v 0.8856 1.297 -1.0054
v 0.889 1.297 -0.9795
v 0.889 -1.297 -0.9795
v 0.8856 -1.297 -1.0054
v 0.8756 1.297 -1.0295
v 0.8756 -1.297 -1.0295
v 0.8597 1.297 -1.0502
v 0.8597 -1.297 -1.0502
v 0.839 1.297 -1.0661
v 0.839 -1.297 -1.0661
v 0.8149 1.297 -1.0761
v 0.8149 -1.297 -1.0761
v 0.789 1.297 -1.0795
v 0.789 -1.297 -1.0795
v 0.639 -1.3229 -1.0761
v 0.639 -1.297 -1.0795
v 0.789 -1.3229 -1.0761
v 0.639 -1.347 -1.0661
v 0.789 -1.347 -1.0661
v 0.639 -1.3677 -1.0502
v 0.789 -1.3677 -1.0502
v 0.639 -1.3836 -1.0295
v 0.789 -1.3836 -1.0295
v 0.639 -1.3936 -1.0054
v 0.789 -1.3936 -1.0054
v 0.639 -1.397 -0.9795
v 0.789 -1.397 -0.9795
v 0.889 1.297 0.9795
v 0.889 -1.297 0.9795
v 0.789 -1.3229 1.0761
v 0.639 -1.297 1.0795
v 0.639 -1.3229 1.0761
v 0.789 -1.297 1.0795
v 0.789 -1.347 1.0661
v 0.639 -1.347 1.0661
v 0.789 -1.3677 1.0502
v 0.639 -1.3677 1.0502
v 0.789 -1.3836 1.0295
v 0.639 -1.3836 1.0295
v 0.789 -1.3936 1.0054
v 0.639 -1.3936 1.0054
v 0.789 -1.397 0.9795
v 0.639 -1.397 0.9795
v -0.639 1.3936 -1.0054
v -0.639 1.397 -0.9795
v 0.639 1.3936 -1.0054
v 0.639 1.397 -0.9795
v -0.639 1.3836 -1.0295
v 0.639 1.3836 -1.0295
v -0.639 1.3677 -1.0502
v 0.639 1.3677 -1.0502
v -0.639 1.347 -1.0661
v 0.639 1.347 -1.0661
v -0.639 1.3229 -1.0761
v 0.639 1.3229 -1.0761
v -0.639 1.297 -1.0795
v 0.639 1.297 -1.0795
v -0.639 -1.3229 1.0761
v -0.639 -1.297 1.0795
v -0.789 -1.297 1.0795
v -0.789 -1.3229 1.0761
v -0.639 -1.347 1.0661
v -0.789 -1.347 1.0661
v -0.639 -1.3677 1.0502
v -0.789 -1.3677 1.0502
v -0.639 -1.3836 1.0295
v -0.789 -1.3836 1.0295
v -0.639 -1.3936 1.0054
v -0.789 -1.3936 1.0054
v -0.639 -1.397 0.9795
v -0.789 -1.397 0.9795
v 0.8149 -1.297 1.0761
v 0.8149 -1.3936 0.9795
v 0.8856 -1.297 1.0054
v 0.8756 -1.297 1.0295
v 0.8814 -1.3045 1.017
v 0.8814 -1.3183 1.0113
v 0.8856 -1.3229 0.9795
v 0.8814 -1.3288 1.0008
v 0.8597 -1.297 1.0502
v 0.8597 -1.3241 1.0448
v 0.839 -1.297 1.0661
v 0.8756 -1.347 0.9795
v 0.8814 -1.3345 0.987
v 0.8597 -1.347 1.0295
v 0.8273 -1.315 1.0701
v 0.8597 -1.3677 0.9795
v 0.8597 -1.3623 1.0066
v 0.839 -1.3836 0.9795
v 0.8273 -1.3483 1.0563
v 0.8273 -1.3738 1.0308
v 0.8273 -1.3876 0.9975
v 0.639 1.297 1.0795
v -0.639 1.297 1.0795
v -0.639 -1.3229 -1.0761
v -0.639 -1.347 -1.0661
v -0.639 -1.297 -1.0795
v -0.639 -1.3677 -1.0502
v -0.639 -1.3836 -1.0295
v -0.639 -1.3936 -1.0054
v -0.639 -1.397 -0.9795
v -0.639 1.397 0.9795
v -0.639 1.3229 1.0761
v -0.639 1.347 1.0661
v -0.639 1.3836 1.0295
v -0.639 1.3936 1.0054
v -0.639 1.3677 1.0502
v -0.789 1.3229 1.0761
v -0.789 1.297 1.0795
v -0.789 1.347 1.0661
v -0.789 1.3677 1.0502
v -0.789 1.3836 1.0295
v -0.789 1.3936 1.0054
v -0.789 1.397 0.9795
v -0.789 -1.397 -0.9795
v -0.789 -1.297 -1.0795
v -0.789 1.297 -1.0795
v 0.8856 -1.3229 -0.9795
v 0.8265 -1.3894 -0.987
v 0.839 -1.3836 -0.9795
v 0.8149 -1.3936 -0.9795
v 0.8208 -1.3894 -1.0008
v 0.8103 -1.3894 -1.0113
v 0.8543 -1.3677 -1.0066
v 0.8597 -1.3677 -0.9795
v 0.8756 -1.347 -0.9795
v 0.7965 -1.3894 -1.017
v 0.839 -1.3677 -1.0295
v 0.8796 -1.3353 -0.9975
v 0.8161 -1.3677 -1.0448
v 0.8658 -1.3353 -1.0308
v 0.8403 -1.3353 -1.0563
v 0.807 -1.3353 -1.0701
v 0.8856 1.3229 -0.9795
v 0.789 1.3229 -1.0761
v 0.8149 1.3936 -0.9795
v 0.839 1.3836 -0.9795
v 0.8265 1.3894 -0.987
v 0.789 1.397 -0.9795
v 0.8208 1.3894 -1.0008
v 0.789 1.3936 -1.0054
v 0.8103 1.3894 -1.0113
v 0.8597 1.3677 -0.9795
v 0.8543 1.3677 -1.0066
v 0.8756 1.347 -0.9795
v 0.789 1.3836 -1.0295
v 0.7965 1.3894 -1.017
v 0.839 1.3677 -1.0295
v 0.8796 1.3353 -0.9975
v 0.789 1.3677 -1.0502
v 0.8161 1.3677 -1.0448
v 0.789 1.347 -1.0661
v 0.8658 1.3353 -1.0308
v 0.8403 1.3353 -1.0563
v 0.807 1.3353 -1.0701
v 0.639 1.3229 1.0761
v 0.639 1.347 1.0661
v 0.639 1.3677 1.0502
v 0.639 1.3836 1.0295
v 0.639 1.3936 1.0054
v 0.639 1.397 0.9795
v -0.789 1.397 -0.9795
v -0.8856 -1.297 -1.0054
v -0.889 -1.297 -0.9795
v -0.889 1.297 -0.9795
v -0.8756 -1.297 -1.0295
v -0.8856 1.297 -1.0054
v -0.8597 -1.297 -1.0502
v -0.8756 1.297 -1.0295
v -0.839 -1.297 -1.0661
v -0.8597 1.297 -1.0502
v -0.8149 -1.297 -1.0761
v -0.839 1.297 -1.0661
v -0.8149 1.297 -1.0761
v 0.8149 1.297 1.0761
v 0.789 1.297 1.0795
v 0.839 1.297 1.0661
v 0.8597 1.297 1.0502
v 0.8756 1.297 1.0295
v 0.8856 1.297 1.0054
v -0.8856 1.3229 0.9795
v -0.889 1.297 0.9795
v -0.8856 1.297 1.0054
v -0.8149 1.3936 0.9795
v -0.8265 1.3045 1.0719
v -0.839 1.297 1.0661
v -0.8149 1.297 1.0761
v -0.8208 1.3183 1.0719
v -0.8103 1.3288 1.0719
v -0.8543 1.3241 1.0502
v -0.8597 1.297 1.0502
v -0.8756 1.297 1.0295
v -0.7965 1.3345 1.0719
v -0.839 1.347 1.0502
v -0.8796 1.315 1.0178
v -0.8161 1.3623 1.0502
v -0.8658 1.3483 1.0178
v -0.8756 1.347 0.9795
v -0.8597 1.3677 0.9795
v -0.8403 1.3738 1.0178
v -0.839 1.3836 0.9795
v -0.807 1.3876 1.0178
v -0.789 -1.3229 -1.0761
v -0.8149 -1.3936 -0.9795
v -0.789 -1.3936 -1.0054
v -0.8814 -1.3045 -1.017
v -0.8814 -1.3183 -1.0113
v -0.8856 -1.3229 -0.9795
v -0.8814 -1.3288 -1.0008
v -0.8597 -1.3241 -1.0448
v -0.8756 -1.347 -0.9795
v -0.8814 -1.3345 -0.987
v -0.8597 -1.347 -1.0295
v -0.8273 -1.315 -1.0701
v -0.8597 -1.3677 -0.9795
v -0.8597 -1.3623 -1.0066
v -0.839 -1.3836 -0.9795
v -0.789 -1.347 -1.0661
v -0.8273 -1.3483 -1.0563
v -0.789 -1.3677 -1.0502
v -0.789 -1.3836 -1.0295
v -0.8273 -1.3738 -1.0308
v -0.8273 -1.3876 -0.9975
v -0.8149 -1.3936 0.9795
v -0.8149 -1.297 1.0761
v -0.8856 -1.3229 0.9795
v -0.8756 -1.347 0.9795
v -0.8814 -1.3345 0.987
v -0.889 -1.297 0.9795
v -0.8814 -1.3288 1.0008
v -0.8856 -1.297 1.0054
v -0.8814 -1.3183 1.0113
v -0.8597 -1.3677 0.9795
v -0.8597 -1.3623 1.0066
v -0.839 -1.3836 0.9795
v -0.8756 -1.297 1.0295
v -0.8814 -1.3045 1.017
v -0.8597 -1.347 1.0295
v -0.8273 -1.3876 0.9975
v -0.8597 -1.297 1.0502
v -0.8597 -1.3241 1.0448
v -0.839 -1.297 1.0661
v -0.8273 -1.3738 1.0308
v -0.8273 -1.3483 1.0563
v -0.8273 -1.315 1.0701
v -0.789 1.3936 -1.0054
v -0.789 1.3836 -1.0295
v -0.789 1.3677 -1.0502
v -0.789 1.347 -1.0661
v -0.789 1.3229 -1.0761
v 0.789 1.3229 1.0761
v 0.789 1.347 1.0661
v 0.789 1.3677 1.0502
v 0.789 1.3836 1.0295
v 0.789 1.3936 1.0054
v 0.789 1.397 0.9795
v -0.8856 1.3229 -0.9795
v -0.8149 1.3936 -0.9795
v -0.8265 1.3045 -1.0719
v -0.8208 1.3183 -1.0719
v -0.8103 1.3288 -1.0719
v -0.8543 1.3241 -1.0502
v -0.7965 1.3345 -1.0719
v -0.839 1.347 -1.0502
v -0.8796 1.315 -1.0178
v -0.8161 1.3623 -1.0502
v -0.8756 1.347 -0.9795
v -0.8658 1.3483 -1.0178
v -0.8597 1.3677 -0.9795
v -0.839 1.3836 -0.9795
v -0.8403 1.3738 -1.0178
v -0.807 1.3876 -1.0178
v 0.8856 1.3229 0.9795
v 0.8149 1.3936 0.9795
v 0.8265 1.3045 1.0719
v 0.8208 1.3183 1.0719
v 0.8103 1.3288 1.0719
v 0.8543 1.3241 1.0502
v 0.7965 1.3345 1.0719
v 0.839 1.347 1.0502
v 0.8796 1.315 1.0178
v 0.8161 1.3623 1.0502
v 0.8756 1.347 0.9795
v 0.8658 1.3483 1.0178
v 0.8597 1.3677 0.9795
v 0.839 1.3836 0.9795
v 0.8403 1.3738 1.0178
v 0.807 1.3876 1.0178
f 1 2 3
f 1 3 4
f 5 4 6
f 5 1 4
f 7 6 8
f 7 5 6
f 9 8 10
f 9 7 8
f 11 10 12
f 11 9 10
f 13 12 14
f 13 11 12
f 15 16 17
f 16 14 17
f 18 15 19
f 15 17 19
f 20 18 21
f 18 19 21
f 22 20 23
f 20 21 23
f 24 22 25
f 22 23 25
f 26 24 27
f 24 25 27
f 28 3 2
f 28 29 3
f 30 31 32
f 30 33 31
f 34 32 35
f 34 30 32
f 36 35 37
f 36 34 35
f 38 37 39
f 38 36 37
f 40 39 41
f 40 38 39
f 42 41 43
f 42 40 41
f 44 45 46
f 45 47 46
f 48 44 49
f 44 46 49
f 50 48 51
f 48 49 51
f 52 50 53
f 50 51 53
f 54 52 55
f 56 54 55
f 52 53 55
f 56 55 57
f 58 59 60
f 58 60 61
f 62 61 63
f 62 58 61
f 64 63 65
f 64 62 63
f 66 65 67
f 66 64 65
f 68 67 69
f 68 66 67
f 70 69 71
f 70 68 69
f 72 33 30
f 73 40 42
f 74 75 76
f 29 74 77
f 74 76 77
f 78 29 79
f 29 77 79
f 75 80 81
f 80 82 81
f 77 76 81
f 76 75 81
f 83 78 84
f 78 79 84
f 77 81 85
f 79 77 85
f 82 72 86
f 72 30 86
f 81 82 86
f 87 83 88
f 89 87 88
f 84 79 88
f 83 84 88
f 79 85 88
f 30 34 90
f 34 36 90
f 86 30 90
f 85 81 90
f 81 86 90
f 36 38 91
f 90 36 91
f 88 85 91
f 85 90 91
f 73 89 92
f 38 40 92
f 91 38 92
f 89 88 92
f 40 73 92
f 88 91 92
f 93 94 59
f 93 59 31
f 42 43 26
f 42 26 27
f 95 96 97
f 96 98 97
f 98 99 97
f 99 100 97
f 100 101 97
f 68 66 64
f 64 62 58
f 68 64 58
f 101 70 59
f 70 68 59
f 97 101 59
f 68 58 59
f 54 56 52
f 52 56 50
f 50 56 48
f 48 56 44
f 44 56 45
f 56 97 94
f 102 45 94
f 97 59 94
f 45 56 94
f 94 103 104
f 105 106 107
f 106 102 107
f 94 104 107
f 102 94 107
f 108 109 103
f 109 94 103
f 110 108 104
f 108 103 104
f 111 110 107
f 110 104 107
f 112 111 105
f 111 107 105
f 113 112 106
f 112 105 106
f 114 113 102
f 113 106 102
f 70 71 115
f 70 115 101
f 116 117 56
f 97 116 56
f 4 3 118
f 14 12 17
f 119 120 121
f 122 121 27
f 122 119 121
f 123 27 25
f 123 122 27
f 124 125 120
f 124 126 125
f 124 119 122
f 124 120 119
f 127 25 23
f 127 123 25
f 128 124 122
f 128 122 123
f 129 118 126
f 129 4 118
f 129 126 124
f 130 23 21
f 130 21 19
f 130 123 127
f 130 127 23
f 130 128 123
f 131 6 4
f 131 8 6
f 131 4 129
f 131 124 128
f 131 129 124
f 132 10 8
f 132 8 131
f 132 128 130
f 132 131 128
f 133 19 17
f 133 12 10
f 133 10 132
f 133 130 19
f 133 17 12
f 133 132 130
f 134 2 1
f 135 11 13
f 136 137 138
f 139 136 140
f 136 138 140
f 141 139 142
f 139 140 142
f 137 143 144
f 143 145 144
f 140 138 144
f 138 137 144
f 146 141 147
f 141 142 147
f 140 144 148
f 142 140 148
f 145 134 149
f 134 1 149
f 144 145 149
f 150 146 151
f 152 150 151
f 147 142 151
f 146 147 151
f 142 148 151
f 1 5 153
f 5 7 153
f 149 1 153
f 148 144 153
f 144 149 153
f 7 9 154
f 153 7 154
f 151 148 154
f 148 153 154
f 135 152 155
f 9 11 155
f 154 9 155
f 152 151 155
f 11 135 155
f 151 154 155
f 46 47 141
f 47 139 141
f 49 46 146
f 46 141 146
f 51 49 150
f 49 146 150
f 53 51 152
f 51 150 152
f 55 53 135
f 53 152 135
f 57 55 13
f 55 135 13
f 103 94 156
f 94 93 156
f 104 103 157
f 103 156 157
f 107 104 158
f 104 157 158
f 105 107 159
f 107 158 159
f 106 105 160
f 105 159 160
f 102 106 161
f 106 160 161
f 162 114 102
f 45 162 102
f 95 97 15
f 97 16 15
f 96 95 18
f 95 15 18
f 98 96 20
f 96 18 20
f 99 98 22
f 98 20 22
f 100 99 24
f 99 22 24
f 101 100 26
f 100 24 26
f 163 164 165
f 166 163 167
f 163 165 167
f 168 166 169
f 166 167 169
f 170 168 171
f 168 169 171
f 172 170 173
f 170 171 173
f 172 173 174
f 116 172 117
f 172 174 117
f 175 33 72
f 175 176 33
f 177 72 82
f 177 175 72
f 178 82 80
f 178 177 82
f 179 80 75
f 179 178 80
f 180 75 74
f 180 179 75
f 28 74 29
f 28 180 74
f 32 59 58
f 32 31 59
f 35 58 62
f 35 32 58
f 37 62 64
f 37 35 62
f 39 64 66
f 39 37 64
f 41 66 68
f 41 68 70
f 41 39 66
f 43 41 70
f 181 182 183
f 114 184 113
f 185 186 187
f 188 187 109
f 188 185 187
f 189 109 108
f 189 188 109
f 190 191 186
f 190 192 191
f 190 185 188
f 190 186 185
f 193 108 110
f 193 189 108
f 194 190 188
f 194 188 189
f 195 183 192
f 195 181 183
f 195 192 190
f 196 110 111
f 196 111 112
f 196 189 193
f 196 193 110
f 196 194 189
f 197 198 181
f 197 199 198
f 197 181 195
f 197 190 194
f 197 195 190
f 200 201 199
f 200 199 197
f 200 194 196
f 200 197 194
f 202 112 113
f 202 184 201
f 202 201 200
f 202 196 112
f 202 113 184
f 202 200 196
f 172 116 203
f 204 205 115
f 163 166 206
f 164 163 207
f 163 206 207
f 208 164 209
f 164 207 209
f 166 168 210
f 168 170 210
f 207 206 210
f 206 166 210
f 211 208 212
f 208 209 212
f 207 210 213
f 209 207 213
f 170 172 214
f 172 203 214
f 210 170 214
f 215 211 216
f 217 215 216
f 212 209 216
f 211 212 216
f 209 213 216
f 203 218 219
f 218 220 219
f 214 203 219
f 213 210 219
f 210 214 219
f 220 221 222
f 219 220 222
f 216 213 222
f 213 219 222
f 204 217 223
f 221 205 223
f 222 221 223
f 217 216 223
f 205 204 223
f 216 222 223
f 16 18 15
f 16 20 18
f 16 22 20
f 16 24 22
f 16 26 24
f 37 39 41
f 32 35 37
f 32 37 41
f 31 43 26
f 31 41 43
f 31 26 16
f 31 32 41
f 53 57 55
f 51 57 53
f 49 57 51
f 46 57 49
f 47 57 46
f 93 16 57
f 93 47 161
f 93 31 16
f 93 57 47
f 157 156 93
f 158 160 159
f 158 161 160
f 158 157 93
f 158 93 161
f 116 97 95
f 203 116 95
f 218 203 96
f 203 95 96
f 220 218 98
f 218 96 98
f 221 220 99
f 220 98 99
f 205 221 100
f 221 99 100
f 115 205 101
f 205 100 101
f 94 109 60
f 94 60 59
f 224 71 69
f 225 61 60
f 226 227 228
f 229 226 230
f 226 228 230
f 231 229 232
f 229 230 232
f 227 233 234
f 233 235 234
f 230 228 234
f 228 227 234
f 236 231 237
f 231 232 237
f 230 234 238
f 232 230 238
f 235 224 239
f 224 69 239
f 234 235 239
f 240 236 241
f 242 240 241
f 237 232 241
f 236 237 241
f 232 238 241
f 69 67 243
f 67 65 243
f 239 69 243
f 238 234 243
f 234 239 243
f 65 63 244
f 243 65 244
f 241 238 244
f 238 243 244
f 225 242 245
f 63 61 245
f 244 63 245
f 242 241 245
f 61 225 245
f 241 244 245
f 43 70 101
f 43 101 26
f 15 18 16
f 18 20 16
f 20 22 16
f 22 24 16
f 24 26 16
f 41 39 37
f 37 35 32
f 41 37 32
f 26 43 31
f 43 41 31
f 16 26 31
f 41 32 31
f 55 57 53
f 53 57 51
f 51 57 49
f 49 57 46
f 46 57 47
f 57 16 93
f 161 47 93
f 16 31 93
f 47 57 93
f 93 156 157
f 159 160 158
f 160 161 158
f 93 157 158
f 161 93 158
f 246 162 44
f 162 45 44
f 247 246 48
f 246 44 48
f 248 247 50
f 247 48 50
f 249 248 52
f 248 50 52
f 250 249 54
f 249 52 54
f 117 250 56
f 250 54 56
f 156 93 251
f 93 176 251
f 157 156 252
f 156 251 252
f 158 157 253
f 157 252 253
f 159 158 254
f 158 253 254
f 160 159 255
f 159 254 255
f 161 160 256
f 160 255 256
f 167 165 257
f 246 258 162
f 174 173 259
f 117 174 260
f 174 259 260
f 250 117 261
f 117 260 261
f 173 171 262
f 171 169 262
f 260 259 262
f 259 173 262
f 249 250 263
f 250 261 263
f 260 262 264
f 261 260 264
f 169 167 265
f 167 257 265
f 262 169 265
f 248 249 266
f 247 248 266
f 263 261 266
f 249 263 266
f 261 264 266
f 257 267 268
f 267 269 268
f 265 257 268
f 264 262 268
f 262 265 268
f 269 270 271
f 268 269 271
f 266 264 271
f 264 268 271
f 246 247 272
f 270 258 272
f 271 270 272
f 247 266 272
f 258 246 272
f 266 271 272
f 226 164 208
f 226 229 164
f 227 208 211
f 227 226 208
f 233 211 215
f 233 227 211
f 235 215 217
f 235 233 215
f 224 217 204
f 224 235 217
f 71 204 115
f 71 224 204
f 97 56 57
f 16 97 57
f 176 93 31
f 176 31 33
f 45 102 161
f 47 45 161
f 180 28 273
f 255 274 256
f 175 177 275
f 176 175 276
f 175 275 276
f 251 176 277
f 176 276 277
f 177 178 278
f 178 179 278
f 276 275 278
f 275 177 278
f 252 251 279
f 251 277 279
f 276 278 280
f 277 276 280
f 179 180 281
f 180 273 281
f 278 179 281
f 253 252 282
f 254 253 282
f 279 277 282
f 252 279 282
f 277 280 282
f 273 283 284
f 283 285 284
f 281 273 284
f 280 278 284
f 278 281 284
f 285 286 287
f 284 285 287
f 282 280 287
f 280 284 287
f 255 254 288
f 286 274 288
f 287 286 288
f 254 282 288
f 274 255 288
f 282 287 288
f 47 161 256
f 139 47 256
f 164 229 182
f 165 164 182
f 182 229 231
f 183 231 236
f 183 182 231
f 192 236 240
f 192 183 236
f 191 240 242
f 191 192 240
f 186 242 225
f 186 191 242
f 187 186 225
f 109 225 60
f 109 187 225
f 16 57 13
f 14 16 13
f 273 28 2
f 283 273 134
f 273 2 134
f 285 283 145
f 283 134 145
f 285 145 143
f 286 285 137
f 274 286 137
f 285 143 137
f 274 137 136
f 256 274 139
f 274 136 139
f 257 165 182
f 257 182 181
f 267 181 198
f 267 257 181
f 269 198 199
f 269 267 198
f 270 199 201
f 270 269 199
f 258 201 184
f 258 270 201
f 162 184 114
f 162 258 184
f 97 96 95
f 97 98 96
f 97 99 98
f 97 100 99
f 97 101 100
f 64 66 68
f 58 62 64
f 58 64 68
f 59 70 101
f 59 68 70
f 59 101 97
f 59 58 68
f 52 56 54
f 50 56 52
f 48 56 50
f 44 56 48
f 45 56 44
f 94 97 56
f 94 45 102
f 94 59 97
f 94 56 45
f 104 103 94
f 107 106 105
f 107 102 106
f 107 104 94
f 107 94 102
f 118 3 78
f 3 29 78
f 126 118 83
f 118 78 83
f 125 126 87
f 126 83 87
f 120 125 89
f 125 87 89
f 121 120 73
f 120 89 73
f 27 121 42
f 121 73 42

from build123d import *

# Parameters (mm, degrees)
F2_W     = 1.278
F2_H     = 2.794
F3_DEPTH = 1.0795
F2_W_2   = 0.25
F4_DEPTH = 1.0795
F5_DEPTH = 1.0795
F6_R     = 0.1
F6_2_R   = 0.1
F6_3_R   = 0.1


with BuildPart() as f3:
    # F2 (on Top) → F3 (new body, symmetric)
    with BuildSketch(Plane.XY):
        Rectangle(F2_W, F2_H)
    extrude(amount=F3_DEPTH, both=True)

    # F6#2
    f6_2_edges = [f3.edges().sort_by_distance(p)[0] for p in [
        (0, -1.397, 1.0795),
        (0, -1.397, -1.0795),
        (0, 1.397, 1.0795),
        (0, 1.397, -1.0795),
    ]]
    fillet(f6_2_edges, radius=F6_2_R)


with BuildPart() as f4:
    # F2 (on Top) → F4 (new body, symmetric)
    with BuildSketch(Plane.XY):
        with Locations((-0.764, 0)):
            Rectangle(F2_W_2, F2_H)
    extrude(amount=F4_DEPTH, both=True)

    # F6
    f6_edges = [f4.edges().sort_by_distance(p)[0] for p in [
        (-0.764, -1.397, 1.0795),
        (-0.764, -1.397, -1.0795),
        (-0.889, 1.397, 0),
        (-0.889, 0, -1.0795),
        (-0.889, -1.397, 0),
        (-0.889, 0, 1.0795),
        (-0.764, 1.397, -1.0795),
        (-0.764, 1.397, 1.0795),
    ]]
    fillet(f6_edges, radius=F6_R)


with BuildPart() as f5:
    # F2 (on Top) → F5 (new body, symmetric)
    with BuildSketch(Plane.XY):
        with Locations((0.764, 0)):
            Rectangle(F2_W_2, F2_H)
    extrude(amount=F5_DEPTH, both=True)

    # F6#3
    f6_3_edges = [f5.edges().sort_by_distance(p)[0] for p in [
        (0.764, -1.397, 1.0795),
        (0.889, 0, -1.0795),
        (0.889, 1.397, 0),
        (0.889, 0, 1.0795),
        (0.889, -1.397, 0),
        (0.764, -1.397, -1.0795),
        (0.764, 1.397, 1.0795),
        (0.764, 1.397, -1.0795),
    ]]
    fillet(f6_3_edges, radius=F6_3_R)


solid = Compound([f3.part, f4.part, f5.part])
